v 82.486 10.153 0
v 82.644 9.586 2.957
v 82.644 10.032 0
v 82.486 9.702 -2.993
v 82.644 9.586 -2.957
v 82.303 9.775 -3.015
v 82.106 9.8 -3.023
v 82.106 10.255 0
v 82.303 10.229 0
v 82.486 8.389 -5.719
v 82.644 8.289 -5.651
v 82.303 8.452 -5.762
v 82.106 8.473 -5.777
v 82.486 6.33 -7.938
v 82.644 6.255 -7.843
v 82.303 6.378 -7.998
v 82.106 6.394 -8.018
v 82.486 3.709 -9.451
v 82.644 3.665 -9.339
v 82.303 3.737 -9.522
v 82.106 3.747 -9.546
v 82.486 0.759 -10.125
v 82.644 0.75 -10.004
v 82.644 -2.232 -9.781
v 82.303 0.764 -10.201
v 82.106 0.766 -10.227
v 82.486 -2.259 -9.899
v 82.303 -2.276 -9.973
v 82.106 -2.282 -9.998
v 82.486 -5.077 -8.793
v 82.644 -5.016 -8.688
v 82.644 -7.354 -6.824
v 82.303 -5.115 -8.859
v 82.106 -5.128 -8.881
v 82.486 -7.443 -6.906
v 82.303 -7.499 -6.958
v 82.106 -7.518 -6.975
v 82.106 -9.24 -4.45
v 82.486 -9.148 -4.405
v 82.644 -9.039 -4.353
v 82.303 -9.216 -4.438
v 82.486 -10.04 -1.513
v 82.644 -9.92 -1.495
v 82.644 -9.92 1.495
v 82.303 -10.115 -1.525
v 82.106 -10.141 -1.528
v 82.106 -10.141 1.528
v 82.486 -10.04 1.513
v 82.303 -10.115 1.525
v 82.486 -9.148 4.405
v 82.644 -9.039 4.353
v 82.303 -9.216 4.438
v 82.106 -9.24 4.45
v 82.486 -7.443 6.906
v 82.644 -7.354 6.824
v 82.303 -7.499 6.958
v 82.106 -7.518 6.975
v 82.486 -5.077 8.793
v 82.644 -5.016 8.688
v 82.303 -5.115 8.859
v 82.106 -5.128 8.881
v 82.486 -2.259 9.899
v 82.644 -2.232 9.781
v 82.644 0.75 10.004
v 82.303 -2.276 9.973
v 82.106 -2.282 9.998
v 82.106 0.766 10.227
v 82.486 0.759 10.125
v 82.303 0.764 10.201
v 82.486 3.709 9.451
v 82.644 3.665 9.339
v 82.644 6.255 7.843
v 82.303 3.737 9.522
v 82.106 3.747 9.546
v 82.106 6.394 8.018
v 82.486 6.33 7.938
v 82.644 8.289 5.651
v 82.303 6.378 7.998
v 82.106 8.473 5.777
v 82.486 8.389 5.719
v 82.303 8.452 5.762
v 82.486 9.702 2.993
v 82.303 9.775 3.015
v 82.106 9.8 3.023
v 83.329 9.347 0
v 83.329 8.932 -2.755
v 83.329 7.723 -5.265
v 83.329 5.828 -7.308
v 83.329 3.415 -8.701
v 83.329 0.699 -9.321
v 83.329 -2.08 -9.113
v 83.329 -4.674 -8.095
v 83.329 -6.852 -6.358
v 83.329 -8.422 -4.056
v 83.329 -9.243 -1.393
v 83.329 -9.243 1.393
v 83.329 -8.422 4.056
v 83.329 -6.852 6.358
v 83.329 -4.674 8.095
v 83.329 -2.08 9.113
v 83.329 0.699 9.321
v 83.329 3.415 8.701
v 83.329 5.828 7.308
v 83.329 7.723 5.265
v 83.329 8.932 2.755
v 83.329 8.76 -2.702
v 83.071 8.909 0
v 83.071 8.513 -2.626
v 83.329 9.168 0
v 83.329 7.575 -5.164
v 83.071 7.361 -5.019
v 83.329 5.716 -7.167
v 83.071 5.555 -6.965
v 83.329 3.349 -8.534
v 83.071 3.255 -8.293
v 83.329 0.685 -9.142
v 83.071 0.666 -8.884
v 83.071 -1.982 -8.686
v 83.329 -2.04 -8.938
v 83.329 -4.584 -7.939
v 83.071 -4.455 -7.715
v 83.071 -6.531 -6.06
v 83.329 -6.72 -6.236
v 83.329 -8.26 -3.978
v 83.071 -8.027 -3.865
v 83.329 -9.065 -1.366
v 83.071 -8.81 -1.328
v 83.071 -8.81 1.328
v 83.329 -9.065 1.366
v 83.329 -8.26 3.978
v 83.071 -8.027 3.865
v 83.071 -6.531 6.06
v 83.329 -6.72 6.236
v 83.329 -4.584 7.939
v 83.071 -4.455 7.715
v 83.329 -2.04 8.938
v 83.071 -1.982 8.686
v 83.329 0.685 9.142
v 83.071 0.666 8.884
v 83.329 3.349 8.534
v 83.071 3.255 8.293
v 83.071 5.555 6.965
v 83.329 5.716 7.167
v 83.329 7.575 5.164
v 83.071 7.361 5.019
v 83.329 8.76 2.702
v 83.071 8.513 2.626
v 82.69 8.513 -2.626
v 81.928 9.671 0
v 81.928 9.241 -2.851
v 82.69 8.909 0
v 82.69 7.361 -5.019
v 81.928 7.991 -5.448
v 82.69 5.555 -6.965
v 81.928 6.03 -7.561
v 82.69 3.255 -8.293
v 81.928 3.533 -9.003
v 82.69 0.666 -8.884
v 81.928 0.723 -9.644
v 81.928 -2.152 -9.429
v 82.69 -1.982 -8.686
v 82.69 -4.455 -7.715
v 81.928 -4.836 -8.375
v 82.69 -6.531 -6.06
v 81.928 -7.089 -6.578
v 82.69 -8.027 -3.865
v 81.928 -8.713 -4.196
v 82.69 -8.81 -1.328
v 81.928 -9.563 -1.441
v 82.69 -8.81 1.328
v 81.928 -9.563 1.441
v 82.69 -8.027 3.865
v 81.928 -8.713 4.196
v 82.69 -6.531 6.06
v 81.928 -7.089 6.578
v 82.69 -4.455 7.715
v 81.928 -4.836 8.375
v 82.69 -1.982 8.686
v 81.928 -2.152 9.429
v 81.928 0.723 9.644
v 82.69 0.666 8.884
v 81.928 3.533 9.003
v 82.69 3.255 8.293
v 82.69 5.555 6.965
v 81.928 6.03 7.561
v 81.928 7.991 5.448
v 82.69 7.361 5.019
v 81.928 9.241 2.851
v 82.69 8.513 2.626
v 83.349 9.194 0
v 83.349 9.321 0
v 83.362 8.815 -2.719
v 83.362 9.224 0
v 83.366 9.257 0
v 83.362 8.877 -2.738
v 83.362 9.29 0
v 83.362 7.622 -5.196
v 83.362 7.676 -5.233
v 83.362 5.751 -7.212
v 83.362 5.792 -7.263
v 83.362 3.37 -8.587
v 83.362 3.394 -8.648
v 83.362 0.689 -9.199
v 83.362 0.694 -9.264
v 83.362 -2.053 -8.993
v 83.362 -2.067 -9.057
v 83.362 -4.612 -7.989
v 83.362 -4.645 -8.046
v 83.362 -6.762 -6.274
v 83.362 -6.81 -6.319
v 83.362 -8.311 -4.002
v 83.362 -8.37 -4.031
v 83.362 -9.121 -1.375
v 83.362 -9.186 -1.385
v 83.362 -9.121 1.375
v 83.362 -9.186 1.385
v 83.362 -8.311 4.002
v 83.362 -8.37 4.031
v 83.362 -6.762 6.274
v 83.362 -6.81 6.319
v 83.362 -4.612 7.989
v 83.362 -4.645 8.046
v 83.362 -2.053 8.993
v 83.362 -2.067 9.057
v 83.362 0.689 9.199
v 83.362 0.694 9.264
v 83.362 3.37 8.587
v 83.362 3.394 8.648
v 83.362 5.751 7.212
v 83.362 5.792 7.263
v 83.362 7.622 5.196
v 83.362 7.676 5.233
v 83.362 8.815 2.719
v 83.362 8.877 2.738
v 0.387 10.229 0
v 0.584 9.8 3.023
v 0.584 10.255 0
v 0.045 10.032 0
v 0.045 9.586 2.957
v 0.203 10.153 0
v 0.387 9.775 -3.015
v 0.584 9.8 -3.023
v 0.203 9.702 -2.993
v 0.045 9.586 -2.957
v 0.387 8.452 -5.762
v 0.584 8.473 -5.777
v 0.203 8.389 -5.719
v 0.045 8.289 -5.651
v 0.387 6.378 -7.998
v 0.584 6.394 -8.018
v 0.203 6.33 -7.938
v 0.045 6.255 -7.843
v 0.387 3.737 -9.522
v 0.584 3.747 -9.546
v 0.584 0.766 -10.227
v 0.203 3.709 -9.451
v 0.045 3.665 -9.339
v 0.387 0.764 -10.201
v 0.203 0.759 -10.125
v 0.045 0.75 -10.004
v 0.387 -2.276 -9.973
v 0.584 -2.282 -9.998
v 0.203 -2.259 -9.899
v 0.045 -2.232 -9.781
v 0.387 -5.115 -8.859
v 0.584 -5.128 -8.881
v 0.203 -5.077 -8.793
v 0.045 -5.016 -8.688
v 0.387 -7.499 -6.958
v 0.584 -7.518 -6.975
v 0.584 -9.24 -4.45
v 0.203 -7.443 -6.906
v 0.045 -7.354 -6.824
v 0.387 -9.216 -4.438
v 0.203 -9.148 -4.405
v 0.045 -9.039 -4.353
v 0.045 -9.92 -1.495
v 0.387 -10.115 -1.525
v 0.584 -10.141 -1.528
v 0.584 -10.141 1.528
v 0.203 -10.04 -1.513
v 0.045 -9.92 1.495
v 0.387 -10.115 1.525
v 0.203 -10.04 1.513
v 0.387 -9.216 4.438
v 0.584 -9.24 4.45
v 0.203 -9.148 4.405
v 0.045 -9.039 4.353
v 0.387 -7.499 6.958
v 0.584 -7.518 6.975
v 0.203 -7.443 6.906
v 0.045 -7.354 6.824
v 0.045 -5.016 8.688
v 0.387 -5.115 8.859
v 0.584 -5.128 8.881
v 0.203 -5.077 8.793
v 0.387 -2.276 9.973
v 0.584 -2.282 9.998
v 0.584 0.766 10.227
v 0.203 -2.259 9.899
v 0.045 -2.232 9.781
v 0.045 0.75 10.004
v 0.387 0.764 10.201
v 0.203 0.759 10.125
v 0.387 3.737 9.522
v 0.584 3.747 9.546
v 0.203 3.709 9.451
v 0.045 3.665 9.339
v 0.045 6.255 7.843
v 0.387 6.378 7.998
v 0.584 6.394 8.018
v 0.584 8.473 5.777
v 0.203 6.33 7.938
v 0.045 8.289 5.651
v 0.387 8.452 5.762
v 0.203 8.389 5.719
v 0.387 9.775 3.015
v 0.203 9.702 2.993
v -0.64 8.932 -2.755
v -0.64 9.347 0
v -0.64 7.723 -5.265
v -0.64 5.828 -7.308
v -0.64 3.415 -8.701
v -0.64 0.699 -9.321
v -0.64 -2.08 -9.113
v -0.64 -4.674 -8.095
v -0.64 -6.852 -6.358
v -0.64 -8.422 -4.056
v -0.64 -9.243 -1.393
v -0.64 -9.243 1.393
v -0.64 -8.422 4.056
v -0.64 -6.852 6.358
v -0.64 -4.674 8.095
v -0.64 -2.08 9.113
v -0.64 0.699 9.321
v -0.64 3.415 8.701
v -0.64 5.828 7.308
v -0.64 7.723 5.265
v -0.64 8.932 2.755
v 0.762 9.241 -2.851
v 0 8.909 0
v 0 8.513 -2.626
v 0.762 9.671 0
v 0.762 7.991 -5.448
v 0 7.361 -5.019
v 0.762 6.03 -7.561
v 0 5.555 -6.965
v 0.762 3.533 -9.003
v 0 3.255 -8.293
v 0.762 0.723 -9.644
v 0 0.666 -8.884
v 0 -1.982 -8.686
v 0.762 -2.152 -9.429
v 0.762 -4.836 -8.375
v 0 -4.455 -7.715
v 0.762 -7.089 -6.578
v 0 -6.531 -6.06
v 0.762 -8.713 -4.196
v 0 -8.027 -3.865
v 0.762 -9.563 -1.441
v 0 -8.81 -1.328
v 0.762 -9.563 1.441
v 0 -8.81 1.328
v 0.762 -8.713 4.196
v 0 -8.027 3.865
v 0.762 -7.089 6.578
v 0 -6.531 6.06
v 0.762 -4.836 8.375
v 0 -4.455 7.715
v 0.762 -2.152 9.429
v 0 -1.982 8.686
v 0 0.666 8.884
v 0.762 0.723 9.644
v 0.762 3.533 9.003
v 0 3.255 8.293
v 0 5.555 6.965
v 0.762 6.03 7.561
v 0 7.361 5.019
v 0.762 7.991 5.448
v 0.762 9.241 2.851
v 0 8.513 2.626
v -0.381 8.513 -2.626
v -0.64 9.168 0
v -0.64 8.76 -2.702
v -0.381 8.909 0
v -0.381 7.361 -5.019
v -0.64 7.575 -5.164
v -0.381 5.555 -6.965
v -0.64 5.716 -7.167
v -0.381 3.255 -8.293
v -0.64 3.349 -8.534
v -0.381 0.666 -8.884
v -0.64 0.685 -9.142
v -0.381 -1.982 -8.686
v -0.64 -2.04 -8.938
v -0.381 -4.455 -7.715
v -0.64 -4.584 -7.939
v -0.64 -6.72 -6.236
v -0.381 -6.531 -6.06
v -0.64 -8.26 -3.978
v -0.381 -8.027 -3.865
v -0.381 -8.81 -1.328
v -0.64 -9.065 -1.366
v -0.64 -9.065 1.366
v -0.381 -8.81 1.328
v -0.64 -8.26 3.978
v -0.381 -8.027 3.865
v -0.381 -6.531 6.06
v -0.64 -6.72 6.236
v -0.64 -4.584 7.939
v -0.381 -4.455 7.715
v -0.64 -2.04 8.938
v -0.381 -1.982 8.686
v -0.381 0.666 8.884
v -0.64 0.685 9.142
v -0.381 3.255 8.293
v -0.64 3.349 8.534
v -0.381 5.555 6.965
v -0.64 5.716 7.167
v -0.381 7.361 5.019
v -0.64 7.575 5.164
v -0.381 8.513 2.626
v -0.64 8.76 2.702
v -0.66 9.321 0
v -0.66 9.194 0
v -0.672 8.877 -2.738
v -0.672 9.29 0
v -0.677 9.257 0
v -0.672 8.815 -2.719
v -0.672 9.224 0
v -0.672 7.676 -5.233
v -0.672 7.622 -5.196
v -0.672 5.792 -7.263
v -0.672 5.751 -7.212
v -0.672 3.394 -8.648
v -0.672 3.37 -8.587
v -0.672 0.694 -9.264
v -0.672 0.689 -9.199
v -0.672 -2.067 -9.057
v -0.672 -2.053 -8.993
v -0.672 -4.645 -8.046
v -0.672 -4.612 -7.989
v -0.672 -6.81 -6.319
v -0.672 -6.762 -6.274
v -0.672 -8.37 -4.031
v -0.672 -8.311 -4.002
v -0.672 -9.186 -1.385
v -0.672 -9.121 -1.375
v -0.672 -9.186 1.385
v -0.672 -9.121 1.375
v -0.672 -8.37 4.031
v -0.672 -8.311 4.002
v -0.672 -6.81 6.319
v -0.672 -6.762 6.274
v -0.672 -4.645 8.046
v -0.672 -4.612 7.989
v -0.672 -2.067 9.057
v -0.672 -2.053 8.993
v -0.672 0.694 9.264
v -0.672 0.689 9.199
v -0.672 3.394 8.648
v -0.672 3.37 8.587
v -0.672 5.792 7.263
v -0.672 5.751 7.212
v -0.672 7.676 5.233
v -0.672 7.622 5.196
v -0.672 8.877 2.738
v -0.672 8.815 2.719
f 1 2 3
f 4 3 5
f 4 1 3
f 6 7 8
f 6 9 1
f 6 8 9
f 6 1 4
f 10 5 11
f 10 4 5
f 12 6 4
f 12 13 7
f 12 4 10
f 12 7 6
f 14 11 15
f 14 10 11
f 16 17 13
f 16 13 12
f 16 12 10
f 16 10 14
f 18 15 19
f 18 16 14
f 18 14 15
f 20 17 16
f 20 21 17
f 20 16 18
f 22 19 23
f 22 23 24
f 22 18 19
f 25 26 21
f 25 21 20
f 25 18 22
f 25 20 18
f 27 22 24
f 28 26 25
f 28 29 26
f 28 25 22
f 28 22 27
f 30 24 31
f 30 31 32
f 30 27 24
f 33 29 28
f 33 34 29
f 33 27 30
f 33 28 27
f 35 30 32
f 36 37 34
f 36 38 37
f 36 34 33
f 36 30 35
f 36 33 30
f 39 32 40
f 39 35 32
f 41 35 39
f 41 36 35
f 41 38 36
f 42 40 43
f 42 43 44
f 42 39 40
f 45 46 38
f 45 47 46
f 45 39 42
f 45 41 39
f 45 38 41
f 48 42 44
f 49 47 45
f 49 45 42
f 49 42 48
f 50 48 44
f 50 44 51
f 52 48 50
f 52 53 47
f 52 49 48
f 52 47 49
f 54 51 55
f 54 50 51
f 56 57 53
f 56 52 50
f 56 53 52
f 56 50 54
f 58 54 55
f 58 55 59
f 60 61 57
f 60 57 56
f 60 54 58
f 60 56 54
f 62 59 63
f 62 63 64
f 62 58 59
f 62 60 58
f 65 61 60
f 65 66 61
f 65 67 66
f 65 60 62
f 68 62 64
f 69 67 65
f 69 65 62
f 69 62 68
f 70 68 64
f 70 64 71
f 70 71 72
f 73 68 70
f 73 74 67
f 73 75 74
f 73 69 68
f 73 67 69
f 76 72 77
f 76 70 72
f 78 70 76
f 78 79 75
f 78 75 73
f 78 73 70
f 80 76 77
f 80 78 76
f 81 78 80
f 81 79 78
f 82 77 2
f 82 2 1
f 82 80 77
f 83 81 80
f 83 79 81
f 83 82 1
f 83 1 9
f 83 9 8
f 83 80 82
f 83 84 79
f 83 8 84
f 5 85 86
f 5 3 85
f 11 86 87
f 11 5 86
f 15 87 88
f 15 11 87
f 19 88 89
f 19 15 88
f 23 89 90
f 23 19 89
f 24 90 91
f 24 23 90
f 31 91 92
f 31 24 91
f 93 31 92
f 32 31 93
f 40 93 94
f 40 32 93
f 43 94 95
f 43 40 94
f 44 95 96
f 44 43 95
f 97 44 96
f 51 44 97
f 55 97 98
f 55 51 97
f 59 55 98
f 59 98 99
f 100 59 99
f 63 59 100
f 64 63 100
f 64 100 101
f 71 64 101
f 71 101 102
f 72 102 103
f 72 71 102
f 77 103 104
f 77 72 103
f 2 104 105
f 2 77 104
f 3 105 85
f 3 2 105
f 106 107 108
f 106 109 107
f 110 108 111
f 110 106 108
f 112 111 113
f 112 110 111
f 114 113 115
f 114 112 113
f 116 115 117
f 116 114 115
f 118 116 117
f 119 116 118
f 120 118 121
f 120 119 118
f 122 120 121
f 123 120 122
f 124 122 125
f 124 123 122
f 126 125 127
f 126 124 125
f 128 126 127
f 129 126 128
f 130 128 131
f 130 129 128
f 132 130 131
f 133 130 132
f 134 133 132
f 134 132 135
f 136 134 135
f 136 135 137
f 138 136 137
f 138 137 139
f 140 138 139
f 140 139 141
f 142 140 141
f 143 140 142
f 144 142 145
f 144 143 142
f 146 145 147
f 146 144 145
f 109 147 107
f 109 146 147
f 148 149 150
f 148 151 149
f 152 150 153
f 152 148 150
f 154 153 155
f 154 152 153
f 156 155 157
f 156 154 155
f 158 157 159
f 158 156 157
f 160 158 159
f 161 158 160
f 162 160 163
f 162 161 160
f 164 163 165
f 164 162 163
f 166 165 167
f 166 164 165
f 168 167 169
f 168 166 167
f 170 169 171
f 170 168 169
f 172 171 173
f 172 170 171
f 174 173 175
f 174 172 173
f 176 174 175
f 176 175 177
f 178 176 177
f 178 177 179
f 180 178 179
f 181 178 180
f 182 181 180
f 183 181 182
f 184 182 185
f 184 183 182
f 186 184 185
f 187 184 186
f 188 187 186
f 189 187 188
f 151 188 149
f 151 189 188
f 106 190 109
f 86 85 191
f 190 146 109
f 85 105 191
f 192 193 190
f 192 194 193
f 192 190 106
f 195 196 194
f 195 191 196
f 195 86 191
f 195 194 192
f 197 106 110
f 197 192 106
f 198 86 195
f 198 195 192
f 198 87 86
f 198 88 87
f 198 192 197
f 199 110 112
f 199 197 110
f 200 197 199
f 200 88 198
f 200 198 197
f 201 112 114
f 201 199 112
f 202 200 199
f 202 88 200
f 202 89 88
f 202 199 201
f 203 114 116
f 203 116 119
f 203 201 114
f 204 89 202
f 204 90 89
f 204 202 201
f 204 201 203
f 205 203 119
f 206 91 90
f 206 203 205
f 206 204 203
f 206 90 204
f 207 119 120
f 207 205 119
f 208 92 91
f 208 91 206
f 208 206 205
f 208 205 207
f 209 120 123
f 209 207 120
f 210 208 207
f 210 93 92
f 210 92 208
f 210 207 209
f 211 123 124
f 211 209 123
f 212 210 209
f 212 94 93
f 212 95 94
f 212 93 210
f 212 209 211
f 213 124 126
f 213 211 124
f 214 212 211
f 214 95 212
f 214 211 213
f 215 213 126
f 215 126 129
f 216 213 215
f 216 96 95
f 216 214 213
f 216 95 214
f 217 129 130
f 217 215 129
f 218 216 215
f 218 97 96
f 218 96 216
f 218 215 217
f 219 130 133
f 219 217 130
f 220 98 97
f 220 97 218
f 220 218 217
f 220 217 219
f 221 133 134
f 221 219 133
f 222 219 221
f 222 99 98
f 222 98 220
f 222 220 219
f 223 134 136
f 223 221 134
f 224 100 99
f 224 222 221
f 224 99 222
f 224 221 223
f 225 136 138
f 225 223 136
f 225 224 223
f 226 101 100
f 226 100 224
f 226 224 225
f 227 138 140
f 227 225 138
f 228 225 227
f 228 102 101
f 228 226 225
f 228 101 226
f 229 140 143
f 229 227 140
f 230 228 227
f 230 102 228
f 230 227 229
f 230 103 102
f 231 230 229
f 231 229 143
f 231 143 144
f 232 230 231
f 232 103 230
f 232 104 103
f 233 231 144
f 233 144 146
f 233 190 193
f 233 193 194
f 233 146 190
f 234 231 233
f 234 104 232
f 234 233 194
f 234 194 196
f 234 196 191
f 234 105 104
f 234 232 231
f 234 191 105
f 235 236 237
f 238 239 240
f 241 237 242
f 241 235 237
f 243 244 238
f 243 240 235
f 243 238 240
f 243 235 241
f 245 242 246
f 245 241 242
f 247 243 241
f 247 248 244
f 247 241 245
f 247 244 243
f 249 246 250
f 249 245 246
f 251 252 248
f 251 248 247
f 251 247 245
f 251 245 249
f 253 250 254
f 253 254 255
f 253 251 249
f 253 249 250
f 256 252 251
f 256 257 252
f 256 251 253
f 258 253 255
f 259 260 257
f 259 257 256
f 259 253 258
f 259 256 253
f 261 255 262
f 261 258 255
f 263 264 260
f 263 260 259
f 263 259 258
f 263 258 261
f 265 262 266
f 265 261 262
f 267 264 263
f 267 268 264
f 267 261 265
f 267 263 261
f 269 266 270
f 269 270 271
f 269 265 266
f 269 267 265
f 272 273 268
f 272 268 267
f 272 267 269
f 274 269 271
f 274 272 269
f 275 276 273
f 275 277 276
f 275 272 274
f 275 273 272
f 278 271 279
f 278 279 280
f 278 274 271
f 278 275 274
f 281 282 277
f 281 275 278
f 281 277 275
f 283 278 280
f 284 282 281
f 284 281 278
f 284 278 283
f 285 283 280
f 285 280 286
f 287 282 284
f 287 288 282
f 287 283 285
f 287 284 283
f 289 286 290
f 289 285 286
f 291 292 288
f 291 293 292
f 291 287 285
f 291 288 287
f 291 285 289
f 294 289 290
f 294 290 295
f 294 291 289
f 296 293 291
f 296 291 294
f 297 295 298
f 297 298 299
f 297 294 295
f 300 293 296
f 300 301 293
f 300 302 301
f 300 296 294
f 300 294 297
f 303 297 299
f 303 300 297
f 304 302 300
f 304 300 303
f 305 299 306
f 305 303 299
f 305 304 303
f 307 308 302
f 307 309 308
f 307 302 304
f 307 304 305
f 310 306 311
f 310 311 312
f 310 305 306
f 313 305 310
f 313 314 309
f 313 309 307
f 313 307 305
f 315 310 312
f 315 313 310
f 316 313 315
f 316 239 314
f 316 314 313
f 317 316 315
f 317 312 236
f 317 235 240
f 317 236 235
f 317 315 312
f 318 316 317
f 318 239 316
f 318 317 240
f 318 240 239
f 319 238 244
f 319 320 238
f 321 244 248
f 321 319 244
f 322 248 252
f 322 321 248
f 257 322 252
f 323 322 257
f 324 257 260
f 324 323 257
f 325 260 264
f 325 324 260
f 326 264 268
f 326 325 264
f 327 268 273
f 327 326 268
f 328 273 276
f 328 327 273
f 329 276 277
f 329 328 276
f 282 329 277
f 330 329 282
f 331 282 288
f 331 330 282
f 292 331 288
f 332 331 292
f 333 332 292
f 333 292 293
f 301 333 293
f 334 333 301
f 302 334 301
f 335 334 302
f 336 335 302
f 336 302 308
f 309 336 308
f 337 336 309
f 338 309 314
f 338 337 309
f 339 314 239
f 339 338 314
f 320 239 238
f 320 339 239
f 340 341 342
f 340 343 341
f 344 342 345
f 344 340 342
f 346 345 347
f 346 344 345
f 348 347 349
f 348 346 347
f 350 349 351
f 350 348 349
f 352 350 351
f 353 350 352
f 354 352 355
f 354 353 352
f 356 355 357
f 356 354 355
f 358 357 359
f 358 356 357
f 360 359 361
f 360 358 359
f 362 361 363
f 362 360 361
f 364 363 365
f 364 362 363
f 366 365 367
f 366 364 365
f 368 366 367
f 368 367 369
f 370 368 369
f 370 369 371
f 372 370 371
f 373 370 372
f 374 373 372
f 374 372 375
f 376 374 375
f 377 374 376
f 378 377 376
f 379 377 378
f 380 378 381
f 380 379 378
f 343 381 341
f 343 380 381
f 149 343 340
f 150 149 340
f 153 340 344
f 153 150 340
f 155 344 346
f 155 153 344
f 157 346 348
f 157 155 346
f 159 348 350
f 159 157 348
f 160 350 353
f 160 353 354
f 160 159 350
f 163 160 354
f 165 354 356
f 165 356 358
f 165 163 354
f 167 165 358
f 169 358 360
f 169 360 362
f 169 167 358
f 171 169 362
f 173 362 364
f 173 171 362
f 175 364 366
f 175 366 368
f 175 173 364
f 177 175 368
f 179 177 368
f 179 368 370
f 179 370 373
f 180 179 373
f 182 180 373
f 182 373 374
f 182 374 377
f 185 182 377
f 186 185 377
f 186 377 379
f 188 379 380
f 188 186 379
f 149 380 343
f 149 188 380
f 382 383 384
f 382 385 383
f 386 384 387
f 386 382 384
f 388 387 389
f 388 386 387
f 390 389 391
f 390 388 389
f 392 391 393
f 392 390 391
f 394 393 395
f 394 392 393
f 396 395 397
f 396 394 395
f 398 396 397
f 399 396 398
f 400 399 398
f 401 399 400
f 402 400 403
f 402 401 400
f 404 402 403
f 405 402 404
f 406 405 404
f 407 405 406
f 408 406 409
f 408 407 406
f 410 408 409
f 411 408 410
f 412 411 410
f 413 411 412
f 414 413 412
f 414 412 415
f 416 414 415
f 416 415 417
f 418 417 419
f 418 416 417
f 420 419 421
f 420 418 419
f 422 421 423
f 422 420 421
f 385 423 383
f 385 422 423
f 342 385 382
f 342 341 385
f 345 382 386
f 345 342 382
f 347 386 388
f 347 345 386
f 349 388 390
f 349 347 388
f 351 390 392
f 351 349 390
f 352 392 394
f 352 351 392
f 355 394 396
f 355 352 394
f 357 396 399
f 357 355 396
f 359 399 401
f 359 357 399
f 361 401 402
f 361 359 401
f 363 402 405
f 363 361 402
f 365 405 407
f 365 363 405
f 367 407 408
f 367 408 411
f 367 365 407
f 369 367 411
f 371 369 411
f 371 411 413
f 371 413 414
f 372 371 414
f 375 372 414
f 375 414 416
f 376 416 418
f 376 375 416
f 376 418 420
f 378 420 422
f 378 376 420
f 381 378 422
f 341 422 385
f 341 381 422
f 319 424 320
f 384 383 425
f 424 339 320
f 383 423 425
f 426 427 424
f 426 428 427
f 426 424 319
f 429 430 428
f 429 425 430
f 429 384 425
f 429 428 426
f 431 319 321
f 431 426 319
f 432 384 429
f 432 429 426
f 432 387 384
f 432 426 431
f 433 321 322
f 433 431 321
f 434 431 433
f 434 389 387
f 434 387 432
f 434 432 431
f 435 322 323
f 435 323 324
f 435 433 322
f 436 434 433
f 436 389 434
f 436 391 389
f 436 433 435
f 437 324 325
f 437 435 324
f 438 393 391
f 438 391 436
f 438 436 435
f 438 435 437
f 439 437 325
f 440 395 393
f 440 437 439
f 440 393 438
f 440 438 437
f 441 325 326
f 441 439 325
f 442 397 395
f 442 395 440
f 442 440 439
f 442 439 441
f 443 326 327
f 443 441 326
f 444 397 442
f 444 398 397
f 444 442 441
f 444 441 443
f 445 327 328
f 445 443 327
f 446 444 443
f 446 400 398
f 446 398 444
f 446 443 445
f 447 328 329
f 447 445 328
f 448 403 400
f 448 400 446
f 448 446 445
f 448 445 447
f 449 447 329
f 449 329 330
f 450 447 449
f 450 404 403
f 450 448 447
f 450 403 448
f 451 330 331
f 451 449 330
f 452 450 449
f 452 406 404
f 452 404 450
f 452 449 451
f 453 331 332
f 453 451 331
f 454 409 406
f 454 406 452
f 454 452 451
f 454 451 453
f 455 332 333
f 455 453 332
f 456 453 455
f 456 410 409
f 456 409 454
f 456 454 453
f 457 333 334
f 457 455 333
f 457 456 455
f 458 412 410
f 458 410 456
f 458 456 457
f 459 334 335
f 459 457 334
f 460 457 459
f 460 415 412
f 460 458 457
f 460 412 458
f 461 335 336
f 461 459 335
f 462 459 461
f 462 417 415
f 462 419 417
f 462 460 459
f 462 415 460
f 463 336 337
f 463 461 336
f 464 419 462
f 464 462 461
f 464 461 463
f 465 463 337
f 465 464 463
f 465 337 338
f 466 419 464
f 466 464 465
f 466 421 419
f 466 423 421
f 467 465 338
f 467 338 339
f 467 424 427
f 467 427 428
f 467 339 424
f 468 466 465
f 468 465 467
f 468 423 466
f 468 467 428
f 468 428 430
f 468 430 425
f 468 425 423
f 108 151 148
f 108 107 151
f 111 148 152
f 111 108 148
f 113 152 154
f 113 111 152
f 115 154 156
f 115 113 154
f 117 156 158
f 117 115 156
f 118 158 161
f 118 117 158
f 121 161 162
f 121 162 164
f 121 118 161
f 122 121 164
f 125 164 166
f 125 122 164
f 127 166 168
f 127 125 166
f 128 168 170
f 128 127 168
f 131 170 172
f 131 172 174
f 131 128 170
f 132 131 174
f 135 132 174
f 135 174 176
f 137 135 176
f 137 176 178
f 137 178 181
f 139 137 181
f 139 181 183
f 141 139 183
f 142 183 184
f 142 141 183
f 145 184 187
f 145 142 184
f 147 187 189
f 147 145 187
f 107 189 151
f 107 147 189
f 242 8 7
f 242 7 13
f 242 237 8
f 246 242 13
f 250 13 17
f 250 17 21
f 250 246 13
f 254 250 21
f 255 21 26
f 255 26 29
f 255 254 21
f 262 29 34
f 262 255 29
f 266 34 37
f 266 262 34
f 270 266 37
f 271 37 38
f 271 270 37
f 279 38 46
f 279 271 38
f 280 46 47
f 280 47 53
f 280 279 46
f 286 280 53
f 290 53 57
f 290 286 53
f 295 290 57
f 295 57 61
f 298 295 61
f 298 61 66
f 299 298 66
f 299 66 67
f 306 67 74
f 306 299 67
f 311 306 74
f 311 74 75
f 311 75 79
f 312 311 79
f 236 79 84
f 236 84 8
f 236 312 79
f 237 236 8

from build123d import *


with BuildPart() as part:
    # Sketch1 → Revolve1 (revolve)
    with BuildSketch(Plane.XY):
        with BuildLine():
            Line((-0.639512806, 9.167562806), (-0.381, 8.90905))
            Line((-0.381, 8.90905), (0, 8.90905))
            Line((0, 8.90905), (0.762, 9.67105))
            Line((0.762, 9.67105), (81.9277, 9.67105))
            Line((81.9277, 9.67105), (82.6897, 8.90905))
            Line((82.6897, 8.90905), (83.0707, 8.90905))
            Line((83.0707, 8.90905), (83.329212806, 9.167562806))
            ThreePointArc((83.329212806, 9.167562806), (83.366410245, 9.257365367), (83.329212806, 9.347167928))
            Line((83.329212806, 9.347167928), (82.644315367, 10.032065367))
            ThreePointArc((82.644315367, 10.032065367), (82.397104775, 10.197246204), (82.1055, 10.25525))
            Line((82.1055, 10.25525), (0.5842, 10.25525))
            ThreePointArc((0.5842, 10.25525), (0.292595225, 10.197246204), (0.045384633, 10.032065367))
            Line((0.045384633, 10.032065367), (-0.639512806, 9.347167928))
            ThreePointArc((-0.639512806, 9.347167928), (-0.676710245, 9.257365367), (-0.639512806, 9.167562806))
        make_face()
    revolve(axis=Axis((82.6897, 0, 0), (-1, 0, 0)))


solid = part.part
